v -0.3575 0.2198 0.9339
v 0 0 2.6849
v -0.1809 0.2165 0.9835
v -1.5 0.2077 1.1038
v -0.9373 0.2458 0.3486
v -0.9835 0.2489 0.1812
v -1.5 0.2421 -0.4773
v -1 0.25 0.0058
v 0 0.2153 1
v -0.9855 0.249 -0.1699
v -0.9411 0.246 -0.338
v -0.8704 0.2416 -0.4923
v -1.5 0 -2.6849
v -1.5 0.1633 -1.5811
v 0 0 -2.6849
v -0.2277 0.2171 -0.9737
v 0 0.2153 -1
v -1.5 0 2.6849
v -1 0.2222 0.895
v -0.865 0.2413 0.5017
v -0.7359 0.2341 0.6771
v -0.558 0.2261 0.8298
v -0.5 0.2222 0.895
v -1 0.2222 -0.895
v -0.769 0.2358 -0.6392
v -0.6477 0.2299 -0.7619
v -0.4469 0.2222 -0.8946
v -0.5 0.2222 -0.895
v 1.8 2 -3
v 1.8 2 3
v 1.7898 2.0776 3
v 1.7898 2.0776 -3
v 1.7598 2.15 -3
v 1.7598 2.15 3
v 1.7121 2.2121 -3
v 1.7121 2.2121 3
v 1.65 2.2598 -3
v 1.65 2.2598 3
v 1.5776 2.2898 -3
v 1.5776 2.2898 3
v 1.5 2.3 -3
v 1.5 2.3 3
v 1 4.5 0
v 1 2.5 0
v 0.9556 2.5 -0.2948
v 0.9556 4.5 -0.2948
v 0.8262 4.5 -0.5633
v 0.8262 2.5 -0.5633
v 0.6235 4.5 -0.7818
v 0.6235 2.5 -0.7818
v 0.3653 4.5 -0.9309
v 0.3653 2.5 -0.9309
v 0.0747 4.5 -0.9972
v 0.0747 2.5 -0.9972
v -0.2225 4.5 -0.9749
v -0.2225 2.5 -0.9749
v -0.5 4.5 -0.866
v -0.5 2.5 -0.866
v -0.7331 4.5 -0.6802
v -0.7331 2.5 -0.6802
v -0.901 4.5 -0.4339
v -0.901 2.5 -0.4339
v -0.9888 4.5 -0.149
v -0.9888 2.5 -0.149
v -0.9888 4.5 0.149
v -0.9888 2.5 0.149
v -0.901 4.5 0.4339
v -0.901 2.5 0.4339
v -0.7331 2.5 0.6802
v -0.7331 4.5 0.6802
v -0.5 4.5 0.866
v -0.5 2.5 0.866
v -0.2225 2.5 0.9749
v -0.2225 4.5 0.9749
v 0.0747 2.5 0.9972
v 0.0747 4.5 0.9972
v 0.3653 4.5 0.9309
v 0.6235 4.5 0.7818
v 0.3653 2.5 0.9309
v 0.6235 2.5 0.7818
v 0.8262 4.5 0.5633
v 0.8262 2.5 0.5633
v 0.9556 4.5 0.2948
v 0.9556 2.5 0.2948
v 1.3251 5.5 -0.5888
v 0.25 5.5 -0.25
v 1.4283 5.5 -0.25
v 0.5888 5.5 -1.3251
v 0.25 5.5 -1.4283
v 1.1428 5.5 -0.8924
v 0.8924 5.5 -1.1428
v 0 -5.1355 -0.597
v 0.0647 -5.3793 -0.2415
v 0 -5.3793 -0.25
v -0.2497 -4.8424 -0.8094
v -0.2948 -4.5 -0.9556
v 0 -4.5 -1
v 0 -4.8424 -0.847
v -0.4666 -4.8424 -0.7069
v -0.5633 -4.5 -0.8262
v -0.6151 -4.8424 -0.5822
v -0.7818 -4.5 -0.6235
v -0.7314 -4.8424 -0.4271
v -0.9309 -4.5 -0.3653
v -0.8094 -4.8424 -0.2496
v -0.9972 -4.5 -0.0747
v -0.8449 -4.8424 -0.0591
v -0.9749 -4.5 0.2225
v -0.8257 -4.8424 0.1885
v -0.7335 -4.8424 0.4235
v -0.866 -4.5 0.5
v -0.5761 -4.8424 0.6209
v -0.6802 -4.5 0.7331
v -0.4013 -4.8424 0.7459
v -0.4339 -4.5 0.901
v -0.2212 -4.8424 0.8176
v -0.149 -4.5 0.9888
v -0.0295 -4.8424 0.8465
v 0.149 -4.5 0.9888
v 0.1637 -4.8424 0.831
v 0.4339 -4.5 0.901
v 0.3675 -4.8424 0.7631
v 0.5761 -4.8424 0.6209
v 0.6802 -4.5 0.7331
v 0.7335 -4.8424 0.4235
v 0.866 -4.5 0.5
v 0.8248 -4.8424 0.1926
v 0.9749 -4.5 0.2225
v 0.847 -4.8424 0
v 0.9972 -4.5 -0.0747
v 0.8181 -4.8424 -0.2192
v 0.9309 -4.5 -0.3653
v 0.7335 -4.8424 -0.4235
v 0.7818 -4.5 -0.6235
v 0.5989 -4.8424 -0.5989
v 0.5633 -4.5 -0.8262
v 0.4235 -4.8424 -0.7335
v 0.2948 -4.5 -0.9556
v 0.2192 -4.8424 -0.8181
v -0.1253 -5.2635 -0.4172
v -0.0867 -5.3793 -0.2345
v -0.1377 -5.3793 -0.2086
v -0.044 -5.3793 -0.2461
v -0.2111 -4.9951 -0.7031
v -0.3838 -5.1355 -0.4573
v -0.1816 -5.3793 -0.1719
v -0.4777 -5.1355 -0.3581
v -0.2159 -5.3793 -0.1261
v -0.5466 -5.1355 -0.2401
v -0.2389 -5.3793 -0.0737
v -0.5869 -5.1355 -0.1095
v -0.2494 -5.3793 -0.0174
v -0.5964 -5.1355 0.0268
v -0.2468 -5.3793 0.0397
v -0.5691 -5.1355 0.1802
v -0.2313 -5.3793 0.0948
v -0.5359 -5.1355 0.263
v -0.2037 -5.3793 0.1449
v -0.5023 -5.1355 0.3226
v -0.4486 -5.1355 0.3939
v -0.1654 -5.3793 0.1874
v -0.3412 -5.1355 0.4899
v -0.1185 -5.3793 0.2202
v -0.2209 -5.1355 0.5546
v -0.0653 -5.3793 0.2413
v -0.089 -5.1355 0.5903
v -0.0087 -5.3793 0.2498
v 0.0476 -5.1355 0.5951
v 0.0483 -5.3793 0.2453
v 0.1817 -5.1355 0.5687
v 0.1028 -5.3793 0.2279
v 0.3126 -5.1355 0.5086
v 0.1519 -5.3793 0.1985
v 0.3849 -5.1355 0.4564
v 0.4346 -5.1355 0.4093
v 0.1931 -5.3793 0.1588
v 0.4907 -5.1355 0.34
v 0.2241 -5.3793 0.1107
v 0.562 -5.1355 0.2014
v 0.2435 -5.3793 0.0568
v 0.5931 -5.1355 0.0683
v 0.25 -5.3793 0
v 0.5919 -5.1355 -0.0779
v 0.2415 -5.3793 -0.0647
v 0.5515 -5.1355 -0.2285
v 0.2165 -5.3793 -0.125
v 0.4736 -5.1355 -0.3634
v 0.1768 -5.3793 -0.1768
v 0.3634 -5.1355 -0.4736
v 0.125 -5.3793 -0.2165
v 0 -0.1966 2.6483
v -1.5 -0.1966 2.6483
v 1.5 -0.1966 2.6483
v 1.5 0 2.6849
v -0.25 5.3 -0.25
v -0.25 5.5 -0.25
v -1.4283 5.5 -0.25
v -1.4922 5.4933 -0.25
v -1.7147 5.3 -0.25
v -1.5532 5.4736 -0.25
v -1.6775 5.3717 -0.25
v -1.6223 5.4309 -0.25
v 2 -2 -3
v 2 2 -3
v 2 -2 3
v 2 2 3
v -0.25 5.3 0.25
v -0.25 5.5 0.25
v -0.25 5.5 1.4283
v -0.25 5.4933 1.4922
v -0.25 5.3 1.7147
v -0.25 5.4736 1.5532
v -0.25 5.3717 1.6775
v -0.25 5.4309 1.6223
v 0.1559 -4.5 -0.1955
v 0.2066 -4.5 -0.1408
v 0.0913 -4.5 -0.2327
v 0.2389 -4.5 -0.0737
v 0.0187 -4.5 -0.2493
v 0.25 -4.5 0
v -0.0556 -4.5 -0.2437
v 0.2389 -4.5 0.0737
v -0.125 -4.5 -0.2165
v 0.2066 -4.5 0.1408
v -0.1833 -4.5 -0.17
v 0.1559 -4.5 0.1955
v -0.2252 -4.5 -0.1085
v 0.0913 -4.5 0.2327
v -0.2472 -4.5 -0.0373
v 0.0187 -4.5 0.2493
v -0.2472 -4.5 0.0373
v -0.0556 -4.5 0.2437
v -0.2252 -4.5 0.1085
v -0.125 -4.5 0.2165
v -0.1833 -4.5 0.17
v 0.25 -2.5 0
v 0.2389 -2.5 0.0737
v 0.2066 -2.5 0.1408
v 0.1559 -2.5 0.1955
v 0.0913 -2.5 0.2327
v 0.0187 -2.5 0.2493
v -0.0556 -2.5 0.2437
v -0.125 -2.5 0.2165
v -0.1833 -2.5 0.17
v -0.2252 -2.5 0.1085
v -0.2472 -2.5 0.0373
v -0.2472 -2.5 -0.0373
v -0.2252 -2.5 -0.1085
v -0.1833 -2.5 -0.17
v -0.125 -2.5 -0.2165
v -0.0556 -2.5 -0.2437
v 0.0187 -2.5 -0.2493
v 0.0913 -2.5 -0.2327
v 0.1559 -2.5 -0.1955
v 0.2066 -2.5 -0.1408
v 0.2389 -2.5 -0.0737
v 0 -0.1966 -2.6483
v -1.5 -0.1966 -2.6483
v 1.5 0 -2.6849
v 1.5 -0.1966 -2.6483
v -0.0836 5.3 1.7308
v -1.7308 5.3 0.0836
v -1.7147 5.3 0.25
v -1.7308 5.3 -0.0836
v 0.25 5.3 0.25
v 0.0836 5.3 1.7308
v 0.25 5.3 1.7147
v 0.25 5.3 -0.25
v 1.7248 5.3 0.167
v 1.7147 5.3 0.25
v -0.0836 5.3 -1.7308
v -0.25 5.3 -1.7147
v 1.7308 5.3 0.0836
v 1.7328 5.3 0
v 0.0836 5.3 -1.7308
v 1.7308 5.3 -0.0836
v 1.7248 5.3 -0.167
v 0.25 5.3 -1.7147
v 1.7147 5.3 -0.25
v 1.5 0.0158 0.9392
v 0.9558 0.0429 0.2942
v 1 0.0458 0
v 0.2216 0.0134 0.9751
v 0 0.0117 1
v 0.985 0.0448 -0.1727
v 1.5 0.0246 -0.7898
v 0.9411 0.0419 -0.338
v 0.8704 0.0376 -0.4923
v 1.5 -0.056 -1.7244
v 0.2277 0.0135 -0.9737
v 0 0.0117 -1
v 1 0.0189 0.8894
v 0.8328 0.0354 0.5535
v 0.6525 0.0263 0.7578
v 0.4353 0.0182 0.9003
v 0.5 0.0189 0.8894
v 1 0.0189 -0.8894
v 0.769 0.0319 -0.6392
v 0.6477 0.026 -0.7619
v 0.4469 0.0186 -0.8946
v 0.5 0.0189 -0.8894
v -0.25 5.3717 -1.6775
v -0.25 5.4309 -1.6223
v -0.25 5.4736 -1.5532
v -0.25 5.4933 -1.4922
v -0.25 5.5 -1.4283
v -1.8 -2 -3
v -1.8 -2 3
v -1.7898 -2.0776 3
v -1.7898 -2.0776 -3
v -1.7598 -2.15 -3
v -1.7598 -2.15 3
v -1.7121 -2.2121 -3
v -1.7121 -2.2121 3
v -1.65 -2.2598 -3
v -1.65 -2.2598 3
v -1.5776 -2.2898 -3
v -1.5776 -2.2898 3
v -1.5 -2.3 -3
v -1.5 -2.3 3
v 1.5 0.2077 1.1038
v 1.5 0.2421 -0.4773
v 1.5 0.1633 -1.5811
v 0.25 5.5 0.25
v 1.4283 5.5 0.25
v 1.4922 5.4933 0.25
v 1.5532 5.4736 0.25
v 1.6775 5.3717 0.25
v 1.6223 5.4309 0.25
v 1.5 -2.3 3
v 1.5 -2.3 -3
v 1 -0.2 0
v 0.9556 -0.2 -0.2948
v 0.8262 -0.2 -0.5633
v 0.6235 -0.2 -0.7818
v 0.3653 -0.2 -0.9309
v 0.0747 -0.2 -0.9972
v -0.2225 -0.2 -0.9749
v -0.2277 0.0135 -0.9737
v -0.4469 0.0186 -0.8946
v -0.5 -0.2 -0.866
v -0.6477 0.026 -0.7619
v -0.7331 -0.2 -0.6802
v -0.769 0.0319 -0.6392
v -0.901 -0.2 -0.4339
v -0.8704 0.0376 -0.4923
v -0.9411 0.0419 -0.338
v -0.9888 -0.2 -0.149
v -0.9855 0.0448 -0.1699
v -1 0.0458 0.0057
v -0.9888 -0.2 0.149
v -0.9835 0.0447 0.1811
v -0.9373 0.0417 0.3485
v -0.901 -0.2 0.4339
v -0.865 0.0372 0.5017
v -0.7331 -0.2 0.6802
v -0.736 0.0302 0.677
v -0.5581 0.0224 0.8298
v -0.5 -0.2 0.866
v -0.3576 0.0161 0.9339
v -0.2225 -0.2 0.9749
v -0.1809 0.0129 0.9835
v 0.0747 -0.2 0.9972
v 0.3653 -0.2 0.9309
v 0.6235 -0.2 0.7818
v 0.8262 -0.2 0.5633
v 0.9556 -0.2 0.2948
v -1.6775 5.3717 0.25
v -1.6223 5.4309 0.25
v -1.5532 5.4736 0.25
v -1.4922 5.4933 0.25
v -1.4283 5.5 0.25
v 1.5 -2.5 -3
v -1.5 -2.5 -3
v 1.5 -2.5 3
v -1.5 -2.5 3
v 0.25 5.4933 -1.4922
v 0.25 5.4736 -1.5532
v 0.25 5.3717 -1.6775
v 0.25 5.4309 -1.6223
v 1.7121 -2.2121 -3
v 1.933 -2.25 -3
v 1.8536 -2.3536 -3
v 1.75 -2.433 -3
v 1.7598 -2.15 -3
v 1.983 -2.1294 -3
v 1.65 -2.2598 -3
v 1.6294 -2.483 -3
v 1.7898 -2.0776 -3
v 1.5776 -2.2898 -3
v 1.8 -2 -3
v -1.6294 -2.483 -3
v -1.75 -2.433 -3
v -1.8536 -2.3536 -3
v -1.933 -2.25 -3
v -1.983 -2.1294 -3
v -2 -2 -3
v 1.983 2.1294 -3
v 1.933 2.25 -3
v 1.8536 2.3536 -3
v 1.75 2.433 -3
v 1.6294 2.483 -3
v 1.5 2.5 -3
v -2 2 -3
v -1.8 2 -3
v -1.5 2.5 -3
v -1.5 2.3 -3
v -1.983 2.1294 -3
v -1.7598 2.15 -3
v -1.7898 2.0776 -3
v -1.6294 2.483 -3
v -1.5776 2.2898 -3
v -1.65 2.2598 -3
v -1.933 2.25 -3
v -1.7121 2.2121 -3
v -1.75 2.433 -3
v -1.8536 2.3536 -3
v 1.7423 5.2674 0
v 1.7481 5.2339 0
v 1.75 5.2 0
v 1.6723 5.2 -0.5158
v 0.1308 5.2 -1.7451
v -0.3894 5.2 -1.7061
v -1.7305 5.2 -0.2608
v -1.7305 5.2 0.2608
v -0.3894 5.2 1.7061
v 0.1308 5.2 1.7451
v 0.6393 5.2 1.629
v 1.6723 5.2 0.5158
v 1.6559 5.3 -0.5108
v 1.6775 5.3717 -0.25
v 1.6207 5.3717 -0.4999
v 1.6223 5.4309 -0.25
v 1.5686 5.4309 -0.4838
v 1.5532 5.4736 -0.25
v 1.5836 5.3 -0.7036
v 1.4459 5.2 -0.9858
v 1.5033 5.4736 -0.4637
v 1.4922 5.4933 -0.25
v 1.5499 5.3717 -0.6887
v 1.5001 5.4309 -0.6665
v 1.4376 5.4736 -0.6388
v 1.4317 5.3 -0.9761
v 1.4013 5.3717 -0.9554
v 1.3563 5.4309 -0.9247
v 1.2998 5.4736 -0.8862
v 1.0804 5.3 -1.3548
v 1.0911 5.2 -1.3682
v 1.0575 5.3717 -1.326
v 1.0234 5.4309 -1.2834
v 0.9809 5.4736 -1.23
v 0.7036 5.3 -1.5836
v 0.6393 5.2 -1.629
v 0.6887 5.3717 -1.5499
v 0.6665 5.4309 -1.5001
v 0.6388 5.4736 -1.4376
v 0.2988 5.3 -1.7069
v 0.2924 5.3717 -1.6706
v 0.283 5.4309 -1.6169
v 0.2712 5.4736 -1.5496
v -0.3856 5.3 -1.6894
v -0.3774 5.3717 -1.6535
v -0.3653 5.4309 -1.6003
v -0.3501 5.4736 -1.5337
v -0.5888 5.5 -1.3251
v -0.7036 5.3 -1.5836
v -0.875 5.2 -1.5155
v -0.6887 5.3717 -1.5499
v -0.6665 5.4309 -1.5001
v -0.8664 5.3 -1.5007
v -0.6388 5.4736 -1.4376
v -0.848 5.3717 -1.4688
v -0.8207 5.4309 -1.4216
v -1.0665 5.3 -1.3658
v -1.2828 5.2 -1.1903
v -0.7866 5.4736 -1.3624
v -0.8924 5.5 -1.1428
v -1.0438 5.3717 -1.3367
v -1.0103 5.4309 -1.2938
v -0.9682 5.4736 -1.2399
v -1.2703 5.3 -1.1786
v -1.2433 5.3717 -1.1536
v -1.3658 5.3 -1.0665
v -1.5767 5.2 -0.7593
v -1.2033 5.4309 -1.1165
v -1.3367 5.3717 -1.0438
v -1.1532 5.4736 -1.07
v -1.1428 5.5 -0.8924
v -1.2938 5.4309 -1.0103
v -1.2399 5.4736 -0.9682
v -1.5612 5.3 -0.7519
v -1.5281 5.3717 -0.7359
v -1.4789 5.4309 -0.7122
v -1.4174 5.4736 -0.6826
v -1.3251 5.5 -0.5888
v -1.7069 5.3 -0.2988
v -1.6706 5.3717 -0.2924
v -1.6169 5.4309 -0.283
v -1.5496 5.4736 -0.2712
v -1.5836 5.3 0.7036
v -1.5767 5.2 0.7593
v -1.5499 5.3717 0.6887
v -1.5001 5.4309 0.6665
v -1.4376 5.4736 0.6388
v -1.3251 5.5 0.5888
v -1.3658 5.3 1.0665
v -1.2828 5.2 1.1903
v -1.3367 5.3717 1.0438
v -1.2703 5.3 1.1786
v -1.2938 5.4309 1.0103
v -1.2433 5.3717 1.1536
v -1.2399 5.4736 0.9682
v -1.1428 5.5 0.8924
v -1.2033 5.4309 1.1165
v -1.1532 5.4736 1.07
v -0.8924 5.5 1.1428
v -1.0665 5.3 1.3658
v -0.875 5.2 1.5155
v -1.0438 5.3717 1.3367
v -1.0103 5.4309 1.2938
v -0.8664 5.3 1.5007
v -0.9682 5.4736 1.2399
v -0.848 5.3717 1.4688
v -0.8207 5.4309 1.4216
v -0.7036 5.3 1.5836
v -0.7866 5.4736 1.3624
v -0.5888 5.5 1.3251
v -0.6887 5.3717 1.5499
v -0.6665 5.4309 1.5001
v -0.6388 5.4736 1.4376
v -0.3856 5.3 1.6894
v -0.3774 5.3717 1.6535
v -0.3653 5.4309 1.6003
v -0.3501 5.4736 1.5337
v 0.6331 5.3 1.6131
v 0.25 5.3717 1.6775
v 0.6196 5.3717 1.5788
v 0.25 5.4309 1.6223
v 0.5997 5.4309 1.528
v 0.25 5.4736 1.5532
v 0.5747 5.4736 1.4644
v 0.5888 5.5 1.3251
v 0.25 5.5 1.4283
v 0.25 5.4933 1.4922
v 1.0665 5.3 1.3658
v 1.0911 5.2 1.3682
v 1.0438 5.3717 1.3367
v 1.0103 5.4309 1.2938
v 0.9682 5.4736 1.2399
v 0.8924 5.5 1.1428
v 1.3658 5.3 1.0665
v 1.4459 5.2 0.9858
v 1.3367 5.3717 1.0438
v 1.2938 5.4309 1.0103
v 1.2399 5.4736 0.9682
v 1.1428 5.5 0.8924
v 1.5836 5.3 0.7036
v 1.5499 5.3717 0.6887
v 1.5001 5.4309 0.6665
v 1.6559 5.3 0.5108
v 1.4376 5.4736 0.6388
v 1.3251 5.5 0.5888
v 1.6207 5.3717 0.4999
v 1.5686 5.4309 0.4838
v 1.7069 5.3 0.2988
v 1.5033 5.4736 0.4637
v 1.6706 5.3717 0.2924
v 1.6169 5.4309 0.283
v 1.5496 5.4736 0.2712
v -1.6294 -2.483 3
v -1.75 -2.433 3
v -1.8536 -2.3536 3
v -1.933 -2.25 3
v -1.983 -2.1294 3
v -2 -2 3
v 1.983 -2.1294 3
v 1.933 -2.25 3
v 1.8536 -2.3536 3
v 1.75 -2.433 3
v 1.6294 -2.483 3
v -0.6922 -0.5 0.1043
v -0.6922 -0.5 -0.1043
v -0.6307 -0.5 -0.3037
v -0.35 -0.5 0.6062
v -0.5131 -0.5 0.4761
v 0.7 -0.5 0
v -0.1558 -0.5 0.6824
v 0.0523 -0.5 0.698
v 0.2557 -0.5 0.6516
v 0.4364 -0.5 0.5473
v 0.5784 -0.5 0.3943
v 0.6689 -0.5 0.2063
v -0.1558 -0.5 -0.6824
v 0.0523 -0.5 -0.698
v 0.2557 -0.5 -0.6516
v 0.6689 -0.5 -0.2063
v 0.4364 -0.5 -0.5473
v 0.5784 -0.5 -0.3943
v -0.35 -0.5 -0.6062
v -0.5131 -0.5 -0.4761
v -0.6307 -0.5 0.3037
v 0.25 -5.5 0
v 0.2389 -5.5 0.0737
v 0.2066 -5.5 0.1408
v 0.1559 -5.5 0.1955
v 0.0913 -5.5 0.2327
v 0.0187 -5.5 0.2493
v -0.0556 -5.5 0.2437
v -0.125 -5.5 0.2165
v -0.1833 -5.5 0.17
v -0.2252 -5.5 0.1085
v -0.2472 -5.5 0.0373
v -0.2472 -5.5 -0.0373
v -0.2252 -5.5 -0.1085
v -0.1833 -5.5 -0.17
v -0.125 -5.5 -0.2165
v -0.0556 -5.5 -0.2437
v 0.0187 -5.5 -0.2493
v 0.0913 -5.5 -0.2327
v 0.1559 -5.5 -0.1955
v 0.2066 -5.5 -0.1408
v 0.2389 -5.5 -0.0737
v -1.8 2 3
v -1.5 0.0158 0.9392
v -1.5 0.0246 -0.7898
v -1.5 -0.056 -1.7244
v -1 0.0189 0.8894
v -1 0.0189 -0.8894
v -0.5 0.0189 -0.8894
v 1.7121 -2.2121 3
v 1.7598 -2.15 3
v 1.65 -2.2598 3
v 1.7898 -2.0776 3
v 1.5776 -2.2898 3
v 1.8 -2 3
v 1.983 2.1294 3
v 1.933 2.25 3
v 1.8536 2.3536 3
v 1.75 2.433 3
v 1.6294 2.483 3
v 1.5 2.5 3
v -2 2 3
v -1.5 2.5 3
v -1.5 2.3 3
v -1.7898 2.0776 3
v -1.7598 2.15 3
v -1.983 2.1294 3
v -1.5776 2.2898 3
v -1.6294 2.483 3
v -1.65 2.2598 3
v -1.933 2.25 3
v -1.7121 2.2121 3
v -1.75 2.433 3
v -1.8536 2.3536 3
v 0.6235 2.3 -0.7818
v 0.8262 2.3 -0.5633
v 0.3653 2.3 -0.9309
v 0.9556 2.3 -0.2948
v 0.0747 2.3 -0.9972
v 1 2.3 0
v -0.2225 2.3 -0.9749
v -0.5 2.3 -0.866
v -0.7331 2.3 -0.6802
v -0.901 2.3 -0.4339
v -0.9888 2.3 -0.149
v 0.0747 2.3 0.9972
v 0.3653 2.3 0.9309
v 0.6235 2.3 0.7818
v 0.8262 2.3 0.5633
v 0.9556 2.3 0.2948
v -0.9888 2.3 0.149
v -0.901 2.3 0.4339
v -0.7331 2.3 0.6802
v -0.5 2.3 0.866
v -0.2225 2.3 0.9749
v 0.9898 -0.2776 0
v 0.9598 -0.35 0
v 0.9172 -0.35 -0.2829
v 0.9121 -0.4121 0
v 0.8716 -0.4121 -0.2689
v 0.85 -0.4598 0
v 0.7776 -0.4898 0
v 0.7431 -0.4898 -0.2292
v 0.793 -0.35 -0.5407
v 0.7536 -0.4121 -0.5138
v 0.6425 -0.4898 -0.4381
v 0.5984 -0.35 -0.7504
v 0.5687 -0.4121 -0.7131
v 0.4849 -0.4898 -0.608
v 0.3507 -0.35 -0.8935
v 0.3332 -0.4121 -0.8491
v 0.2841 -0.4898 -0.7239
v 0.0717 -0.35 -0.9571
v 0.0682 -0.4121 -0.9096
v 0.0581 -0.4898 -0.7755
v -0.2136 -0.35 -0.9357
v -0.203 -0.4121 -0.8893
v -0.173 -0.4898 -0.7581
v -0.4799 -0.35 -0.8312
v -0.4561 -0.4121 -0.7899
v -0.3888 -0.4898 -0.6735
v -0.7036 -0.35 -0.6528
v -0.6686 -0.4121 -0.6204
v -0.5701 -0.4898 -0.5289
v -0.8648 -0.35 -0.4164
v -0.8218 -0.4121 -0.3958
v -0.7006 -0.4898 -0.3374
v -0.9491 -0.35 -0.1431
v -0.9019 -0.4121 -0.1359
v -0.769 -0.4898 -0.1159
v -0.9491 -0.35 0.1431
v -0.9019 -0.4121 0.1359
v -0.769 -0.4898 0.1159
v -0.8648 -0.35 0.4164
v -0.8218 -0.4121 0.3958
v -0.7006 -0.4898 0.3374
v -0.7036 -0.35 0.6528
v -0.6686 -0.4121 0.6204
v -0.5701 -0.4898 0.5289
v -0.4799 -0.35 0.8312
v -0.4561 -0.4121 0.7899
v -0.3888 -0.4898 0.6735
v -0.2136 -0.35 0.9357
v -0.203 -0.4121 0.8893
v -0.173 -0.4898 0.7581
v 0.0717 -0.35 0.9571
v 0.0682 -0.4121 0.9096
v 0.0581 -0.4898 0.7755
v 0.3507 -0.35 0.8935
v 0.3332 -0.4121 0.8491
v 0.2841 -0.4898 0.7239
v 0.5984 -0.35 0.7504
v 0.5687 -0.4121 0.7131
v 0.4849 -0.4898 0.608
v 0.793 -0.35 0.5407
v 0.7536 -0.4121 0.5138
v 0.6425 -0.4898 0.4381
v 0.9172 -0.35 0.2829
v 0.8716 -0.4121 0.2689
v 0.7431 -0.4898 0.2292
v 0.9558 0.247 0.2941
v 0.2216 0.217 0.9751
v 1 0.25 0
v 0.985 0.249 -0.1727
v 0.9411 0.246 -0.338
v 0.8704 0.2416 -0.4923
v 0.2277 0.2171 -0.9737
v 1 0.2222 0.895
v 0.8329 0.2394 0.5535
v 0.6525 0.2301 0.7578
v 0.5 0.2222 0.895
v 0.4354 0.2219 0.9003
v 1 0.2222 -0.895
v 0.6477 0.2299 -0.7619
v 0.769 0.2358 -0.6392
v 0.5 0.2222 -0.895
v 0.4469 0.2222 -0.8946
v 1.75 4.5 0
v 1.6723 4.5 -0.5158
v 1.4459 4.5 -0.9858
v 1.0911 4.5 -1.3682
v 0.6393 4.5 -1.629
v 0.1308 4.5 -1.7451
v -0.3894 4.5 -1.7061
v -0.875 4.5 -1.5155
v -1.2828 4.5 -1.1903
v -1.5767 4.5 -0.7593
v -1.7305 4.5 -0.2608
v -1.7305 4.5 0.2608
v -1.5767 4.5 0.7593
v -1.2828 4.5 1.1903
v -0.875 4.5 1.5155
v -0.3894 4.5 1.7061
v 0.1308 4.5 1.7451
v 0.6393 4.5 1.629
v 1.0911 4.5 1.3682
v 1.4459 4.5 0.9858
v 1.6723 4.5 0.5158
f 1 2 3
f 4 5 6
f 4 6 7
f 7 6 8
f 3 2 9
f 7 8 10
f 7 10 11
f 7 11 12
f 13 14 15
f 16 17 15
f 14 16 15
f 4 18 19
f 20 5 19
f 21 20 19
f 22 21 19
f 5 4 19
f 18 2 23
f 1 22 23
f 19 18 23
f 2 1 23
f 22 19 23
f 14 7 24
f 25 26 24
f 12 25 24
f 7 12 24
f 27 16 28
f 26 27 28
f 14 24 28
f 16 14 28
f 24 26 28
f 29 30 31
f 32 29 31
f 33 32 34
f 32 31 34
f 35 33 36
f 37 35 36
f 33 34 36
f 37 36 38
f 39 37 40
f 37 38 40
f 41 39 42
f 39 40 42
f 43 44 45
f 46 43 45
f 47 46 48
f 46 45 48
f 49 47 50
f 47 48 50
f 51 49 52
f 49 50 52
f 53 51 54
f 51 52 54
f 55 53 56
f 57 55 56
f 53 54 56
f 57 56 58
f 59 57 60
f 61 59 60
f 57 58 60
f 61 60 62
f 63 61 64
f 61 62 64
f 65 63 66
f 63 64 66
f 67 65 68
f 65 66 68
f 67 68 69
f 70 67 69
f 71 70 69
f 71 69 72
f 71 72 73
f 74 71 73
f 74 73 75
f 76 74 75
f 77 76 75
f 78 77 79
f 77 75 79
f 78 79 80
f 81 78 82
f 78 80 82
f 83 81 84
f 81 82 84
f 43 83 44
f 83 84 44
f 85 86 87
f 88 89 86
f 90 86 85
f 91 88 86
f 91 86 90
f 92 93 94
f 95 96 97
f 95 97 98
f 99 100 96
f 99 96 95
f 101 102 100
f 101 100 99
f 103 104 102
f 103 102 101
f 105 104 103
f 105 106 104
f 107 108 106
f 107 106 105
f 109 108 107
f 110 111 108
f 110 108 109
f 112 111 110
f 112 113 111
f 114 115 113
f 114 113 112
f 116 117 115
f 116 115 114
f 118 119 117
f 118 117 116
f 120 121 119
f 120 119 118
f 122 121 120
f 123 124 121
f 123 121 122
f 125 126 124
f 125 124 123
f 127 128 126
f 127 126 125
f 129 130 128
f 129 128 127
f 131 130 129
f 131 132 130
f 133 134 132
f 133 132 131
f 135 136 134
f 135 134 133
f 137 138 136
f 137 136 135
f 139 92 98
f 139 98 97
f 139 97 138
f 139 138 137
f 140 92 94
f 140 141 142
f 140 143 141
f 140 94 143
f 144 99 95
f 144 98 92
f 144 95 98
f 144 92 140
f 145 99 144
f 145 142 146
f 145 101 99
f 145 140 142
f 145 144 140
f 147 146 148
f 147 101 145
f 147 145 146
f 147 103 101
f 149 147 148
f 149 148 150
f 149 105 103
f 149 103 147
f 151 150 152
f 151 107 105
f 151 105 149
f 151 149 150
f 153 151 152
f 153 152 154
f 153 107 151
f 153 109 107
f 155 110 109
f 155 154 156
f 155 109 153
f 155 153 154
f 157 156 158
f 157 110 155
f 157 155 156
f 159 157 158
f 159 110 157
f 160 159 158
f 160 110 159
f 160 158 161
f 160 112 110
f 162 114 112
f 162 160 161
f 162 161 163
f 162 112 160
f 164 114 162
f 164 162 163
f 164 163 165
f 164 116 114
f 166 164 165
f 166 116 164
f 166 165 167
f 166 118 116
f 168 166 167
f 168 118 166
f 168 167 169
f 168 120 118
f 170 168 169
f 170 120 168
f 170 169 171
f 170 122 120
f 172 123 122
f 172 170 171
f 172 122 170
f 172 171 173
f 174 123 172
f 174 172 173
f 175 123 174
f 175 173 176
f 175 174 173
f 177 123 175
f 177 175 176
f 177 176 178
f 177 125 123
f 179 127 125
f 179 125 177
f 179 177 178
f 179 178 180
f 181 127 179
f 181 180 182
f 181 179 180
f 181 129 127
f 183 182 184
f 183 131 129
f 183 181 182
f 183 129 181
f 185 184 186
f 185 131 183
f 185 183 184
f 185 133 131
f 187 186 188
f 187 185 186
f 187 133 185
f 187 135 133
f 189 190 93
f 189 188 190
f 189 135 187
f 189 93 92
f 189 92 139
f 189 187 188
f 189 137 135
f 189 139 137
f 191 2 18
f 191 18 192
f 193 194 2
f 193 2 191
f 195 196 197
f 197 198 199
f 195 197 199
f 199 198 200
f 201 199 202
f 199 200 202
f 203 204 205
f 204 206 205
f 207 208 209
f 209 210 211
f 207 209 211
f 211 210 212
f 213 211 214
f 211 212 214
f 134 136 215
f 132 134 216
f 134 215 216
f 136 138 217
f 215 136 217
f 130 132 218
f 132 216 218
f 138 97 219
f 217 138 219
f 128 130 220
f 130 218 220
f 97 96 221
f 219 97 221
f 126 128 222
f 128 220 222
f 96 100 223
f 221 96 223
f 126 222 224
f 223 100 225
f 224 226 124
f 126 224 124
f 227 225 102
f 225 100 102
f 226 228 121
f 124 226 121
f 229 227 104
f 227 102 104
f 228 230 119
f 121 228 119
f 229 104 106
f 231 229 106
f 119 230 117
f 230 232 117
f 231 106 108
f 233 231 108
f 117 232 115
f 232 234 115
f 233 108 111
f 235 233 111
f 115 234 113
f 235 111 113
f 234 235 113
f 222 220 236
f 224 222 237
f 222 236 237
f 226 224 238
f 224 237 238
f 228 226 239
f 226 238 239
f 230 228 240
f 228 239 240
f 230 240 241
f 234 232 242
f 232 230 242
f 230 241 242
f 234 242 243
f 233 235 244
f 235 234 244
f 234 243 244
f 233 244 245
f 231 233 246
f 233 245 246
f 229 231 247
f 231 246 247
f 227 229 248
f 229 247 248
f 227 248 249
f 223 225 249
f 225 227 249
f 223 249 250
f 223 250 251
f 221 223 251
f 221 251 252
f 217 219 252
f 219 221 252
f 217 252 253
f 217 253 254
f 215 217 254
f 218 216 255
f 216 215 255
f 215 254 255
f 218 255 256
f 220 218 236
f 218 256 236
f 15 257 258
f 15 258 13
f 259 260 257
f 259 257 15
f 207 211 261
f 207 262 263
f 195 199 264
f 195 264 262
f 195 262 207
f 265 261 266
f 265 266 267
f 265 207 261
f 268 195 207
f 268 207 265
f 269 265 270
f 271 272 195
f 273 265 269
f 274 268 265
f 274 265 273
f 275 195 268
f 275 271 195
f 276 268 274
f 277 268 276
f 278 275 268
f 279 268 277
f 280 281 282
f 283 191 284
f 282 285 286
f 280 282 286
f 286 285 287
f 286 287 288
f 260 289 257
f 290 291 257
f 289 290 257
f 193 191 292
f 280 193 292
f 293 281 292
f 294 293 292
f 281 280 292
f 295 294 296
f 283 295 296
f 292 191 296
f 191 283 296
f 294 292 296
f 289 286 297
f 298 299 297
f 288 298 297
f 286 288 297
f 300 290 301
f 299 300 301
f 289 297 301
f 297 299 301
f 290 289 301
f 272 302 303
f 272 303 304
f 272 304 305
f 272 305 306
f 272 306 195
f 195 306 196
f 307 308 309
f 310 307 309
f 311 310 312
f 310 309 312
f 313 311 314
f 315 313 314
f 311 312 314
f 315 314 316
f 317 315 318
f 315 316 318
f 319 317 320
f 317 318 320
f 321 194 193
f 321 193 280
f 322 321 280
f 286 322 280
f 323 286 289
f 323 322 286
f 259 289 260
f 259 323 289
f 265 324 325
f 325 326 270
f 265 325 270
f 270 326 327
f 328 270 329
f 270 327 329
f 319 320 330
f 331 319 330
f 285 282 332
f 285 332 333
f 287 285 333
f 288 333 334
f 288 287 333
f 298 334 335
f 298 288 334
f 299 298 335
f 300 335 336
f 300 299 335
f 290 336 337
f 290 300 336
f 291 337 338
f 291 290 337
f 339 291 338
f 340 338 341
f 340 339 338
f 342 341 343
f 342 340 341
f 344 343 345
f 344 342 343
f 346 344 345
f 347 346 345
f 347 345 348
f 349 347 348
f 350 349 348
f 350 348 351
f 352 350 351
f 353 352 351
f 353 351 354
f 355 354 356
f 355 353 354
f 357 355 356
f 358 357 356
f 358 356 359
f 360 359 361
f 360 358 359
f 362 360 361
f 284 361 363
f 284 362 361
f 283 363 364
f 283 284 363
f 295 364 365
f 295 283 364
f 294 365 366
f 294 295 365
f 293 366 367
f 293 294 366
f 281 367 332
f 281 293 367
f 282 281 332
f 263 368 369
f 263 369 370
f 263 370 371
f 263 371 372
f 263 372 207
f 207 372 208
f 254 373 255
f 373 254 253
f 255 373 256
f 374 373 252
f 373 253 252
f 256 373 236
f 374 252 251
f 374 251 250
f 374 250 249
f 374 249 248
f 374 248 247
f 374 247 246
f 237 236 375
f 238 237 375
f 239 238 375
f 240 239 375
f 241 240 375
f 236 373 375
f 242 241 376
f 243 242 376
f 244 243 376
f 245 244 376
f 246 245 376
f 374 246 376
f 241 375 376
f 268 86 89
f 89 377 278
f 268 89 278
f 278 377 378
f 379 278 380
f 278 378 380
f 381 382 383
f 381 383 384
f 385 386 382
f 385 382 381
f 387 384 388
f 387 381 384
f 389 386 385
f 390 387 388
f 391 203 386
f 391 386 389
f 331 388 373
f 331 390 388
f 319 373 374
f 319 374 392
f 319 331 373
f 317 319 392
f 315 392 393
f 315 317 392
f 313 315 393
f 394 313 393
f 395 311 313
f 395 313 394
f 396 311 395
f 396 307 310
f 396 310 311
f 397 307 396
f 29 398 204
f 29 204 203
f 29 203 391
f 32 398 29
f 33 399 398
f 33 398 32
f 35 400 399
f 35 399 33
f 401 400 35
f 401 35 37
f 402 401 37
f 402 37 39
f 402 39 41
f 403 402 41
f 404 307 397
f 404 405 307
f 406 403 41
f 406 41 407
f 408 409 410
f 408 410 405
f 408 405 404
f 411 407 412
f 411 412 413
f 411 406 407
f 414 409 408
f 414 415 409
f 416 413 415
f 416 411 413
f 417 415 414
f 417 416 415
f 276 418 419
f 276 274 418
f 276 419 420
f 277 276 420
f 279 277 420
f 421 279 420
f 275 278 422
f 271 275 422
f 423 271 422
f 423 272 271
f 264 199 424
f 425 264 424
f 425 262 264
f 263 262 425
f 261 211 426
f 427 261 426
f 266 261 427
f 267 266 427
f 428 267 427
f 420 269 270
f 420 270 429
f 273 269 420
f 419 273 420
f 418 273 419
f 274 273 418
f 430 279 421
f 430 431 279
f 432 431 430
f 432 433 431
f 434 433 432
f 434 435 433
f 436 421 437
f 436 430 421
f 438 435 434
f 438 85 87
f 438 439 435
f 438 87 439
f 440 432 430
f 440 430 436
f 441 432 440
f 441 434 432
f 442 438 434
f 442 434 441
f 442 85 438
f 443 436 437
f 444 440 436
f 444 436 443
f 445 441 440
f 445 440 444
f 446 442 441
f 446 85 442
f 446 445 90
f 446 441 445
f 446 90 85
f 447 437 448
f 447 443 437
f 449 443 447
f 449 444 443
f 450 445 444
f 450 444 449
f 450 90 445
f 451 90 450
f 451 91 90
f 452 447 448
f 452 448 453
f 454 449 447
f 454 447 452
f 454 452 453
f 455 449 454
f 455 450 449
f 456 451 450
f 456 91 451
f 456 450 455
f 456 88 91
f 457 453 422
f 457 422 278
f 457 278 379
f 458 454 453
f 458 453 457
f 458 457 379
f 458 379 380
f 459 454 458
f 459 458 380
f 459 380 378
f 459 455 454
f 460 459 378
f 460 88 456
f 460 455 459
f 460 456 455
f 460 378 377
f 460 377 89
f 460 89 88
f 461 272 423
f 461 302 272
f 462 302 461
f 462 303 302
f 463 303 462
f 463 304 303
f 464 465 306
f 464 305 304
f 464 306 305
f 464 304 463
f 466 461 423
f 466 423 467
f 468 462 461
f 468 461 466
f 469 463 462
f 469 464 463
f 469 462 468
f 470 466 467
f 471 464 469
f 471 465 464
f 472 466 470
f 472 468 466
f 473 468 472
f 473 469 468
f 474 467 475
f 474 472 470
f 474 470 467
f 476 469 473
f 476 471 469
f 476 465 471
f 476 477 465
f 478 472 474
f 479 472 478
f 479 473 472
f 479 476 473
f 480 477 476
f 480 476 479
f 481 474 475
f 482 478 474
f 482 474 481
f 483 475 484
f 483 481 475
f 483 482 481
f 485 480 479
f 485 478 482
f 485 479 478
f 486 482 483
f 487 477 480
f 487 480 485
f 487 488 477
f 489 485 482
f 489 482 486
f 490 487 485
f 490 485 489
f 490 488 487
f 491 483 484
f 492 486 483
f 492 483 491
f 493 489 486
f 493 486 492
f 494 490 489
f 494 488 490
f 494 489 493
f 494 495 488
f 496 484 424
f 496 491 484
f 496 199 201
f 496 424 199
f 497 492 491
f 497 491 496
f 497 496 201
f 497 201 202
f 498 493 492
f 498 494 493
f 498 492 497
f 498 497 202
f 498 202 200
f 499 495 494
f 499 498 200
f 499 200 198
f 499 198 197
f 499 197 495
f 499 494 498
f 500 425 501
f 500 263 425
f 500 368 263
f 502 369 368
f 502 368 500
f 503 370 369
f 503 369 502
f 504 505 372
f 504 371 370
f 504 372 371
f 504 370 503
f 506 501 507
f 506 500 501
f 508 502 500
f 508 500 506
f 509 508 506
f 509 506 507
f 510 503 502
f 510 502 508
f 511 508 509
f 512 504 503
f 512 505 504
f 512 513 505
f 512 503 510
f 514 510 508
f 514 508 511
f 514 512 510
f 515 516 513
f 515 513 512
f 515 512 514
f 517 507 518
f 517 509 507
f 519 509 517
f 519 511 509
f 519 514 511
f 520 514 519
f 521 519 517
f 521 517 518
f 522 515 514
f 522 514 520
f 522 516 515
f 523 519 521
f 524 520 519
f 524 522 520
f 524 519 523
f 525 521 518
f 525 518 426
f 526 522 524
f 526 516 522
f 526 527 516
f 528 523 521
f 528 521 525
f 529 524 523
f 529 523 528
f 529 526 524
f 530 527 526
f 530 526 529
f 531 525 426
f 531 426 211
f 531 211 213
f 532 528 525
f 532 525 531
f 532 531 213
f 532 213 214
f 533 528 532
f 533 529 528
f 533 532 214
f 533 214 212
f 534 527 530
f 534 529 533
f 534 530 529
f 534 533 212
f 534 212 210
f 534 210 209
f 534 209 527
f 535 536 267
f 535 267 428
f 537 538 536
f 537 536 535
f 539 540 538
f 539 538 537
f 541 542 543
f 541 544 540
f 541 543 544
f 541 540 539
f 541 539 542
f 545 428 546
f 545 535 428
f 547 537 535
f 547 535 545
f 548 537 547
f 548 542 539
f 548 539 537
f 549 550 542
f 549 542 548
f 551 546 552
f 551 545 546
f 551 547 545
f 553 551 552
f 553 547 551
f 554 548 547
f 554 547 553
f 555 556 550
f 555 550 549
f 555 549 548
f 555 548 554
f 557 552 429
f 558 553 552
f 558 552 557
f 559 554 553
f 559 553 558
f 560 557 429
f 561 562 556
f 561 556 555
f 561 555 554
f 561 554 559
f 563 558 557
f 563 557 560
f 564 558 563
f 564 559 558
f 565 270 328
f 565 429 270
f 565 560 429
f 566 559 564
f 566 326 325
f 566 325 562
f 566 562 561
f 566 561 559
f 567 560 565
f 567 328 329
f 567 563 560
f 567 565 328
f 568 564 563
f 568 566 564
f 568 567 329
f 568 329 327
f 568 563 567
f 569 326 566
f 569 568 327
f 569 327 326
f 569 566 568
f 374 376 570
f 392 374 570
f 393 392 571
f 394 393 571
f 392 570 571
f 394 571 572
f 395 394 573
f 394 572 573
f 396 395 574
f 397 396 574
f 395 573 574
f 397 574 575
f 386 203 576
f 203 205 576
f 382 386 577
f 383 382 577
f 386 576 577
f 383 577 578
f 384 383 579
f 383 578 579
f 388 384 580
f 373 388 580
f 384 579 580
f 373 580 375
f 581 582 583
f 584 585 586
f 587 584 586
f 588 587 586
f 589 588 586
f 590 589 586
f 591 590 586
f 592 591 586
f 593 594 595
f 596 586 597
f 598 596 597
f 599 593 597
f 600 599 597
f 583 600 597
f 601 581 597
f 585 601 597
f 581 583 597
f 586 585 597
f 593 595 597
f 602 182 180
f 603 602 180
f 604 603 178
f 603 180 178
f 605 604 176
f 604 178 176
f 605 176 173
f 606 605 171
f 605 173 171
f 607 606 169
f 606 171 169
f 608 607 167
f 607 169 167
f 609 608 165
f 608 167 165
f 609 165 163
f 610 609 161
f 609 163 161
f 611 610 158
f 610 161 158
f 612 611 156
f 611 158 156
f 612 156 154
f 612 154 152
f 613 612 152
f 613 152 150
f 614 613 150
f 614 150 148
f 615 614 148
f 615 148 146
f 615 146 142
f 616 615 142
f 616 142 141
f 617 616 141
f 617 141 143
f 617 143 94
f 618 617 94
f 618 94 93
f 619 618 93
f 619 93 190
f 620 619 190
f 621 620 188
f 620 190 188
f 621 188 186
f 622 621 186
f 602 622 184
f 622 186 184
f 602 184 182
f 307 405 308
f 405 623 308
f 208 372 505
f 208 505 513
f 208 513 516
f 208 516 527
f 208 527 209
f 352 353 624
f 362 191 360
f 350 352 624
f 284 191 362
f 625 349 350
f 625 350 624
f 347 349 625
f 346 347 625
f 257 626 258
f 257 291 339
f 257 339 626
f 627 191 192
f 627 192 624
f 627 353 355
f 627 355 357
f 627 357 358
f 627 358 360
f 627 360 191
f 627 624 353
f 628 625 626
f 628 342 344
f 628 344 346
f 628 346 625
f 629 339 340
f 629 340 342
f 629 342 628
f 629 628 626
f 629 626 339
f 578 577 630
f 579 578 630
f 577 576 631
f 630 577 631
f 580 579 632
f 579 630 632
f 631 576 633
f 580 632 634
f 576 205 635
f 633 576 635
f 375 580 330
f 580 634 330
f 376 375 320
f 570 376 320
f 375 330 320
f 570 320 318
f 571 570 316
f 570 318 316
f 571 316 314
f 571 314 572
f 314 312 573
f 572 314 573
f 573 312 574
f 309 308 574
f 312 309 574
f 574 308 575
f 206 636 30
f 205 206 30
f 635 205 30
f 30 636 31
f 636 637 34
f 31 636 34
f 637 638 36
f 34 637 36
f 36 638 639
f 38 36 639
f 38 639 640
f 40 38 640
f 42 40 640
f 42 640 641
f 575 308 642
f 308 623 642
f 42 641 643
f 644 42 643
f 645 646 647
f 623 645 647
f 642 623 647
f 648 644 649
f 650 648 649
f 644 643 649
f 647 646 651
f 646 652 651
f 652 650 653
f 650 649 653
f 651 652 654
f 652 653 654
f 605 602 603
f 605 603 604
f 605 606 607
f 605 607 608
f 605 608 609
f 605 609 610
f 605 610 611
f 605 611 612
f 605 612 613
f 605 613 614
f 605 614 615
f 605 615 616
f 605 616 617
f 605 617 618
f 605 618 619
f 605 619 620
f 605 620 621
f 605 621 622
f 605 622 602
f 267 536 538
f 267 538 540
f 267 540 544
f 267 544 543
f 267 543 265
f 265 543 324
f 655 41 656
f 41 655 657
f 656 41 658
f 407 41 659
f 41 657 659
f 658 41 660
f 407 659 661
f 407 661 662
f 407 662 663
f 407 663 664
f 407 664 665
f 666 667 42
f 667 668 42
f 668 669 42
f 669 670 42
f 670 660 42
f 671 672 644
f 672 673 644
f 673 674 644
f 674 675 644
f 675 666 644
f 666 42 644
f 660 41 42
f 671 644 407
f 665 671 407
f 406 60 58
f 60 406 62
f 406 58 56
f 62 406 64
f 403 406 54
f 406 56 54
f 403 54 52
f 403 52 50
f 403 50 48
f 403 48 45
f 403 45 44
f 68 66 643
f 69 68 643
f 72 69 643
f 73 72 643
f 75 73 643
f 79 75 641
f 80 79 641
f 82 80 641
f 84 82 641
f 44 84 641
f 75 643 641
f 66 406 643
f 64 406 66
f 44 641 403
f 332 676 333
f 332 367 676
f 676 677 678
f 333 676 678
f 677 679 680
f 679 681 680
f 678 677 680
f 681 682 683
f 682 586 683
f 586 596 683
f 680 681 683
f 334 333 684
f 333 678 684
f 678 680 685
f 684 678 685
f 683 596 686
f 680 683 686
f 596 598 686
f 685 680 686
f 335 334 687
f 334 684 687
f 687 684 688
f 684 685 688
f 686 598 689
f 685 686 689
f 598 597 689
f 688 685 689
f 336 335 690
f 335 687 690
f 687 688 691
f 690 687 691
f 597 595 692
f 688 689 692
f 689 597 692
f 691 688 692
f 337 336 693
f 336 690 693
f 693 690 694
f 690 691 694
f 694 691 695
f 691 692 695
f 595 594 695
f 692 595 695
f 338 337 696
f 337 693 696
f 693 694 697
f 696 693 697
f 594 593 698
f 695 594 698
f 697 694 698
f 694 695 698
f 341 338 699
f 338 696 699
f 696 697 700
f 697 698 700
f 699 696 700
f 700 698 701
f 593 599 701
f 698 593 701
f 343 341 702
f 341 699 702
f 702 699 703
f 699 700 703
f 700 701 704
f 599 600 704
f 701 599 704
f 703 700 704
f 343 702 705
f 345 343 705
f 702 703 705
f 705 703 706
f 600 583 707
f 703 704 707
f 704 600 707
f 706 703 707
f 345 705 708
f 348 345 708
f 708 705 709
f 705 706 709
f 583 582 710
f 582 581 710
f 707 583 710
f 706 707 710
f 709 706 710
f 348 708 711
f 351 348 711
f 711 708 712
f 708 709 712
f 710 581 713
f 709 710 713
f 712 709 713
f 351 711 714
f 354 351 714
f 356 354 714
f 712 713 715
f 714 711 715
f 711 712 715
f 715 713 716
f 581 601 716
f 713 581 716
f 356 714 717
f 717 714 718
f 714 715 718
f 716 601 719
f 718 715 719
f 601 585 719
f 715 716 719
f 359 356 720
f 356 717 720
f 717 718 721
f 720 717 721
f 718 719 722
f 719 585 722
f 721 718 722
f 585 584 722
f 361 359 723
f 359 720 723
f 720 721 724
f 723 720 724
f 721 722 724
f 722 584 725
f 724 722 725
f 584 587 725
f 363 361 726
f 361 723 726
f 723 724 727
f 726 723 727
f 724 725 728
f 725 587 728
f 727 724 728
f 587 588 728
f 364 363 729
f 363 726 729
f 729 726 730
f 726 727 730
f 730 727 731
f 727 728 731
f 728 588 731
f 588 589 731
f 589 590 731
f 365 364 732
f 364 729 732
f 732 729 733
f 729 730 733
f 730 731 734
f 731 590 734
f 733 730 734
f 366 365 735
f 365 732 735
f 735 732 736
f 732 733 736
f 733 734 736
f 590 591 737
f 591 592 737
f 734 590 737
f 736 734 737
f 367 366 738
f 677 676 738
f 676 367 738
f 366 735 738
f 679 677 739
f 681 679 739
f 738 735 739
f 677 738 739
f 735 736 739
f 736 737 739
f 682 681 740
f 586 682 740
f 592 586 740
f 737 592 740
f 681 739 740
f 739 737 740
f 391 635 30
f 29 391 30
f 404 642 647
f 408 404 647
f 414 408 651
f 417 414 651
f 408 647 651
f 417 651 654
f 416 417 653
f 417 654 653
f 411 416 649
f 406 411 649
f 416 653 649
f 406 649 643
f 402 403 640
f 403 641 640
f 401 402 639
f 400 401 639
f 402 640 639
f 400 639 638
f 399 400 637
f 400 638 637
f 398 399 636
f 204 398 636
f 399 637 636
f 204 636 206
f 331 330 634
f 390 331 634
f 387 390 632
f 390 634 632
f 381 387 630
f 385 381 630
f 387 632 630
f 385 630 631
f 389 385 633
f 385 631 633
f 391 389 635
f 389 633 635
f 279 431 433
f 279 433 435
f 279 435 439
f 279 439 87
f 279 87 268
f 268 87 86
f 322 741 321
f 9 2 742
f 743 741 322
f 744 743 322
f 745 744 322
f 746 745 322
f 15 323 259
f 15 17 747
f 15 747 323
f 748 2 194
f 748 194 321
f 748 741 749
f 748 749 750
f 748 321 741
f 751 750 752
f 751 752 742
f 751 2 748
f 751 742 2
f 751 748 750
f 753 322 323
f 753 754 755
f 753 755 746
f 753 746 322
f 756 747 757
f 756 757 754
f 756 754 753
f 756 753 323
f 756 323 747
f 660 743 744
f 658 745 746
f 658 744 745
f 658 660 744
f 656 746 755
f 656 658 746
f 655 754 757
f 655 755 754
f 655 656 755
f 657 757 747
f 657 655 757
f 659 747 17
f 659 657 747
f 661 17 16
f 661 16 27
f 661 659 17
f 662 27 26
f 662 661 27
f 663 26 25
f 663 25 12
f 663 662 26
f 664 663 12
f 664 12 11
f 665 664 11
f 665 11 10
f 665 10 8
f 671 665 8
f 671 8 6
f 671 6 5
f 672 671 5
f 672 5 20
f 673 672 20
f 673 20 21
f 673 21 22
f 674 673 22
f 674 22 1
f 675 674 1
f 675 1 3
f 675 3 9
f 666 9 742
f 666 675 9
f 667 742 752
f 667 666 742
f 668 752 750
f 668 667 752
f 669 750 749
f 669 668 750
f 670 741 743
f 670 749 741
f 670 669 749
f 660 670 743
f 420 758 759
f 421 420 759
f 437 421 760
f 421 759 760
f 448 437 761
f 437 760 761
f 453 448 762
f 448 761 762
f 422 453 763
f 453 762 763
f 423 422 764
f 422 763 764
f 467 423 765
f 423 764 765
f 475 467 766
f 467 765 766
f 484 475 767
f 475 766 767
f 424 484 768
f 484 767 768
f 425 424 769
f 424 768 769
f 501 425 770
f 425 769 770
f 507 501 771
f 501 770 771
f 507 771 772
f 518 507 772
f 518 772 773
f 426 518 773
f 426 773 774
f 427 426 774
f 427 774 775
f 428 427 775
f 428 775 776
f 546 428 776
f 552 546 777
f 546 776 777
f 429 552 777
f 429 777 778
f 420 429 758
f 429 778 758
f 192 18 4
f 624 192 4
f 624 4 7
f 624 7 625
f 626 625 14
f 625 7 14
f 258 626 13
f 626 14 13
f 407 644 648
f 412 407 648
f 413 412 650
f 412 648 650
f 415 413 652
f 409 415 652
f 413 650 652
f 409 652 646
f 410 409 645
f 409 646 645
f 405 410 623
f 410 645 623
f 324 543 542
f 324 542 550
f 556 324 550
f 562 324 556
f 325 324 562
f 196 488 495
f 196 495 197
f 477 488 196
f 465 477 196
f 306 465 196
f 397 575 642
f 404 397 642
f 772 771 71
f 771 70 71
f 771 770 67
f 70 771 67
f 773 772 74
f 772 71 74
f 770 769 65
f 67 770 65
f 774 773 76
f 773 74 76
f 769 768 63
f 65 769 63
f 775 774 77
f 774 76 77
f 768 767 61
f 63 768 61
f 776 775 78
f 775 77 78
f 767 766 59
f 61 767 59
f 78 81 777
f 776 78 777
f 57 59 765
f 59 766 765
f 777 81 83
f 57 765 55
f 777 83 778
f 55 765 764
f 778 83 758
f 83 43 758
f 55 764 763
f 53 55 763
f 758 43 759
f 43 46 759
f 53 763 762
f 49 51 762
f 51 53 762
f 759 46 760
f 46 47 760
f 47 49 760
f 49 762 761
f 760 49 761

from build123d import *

# Parameters (mm, degrees)
Y_KSEKLIK_EKSTR_ZYON1_DEPTH      = 3
Y_KSEKLIK_EKSTR_ZYON1_DEPTH_BACK = 3
Y_KSEKLIK_EKSTR_ZYON7_DEPTH      = 1.5
Y_KSEKLIK_EKSTR_ZYON7_DEPTH_BACK = 1.5
Y_KSEKLIK_EKSTR_ZYON8_DEPTH      = 2
Y_KSEKLIK_EKSTR_ZYON8_DEPTH_BACK = 3
IZIM11_R                         = 1
RADYUS3_R                        = 0.3
IZIM12_R                         = 1.75
Y_KSEKLIK_EKSTR_ZYON9_DEPTH      = 1
RADYUS4_R                        = 0.3
KES_EKSTR_ZYON5_DEPTH            = 0.2
IZIM14_R                         = 0.25
Y_KSEKLIK_EKSTR_ZYON10_DEPTH     = 3


with BuildPart() as part:
    # Çizim1 → Yükseklik-Ekstrüzyon1 (new, two sides: drawn at the far end of the back side and taken through both)
    with BuildSketch(Plane.XY.offset(-Y_KSEKLIK_EKSTR_ZYON1_DEPTH_BACK)):
        with BuildLine():
            Line((-1.5, 2.5), (1.5, 2.5))
            ThreePointArc((1.5, 2.5), (1.853553391, 2.353553391), (2, 2))
            Line((2, 2), (2, -2))
            ThreePointArc((2, -2), (1.853553391, -2.353553391), (1.5, -2.5))
            Line((1.5, -2.5), (-1.5, -2.5))
            ThreePointArc((-1.5, -2.5), (-1.853553391, -2.353553391), (-2, -2))
            Line((-2, -2), (-2, 2))
            ThreePointArc((-2, 2), (-1.853553391, 2.353553391), (-1.5, 2.5))
        make_face()
        with BuildLine():
            Line((-1.8, 2), (-1.8, -2))
            ThreePointArc((-1.8, -2), (-1.712132034, -2.212132034), (-1.5, -2.3))
            Line((-1.5, -2.3), (1.5, -2.3))
            ThreePointArc((1.5, -2.3), (1.712132034, -2.212132034), (1.8, -2))
            Line((1.8, -2), (1.8, 2))
            ThreePointArc((1.8, 2), (1.712132034, 2.212132034), (1.5, 2.3))
            Line((1.5, 2.3), (-1.5, 2.3))
            ThreePointArc((-1.5, 2.3), (-1.712132034, 2.212132034), (-1.8, 2))
        make_face(mode=Mode.SUBTRACT)
    extrude(amount=Y_KSEKLIK_EKSTR_ZYON1_DEPTH + Y_KSEKLIK_EKSTR_ZYON1_DEPTH_BACK)



with BuildPart() as body_2:
    # Çizim10 → Yükseklik-Ekstrüzyon7 (new, two sides: drawn at the far end of the back side and taken through both)
    with BuildSketch(Plane(origin=(0, 0, 0), x_dir=(0, 0, -1), z_dir=(1, 0, 0)).offset(-Y_KSEKLIK_EKSTR_ZYON7_DEPTH_BACK)):
        with BuildLine():
            Line((-2.684933096, 0), (-2.648317711, -0.196619718))
            add(Edge.make_bspline(
                [(-2.648317711, -0.196619718), (-0.912612771, 0.126610857), (0.912612771, 0.126610857), (2.648317711, -0.196619718)],
                knots=[0, 0, 0, 0, 1, 1, 1, 1], degree=3))
            Line((2.648317711, -0.196619718), (2.684933096, 0))
            add(Edge.make_bspline(
                [(-2.684933096, 0), (-0.894977699, 0.333333333), (0.894977699, 0.333333333), (2.684933096, 0)],
                knots=[0, 0, 0, 0, 1, 1, 1, 1], degree=3))
        make_face()
    extrude(amount=Y_KSEKLIK_EKSTR_ZYON7_DEPTH + Y_KSEKLIK_EKSTR_ZYON7_DEPTH_BACK)


with BuildPart() as part_1:
    add(part.part)

    add(body_2.part)  # Yükseklik-Ekstrüzyon8 merges body 2
    # Çizim11 → Yükseklik-Ekstrüzyon8 (add, two sides: drawn at the far end of the back side and taken through both)
    with BuildSketch(Plane(origin=(0, 2.5, 0), x_dir=(1, 0, 0), z_dir=(0, 1, 0)).offset(-Y_KSEKLIK_EKSTR_ZYON8_DEPTH_BACK)):
        Circle(IZIM11_R)
    extrude(amount=Y_KSEKLIK_EKSTR_ZYON8_DEPTH + Y_KSEKLIK_EKSTR_ZYON8_DEPTH_BACK)

    # Radyus3
    radyus3_edges = [part_1.edges().sort_by_distance(p)[0] for p in [
        (-1, -0.5, 0),
    ]]
    fillet(radyus3_edges, radius=RADYUS3_R)

    # Çizim12 → Yükseklik-Ekstrüzyon9 (add)
    with BuildSketch(Plane(origin=(0, 4.5, 0), x_dir=(1, 0, 0), z_dir=(0, 1, 0))):
        Circle(IZIM12_R)
    extrude(amount=Y_KSEKLIK_EKSTR_ZYON9_DEPTH)

    # Radyus4
    radyus4_edges = [part_1.edges().sort_by_distance(p)[0] for p in [
        (-1.75, 5.5, 0),
    ]]
    fillet(radyus4_edges, radius=RADYUS4_R)

    # Çizim13 → Kes-Ekstrüzyon5 (cut)
    with BuildSketch(Plane(origin=(0, 5.5, 0), x_dir=(1, 0, 0), z_dir=(0, 1, 0))):
        Polygon((-0.25, -0.25), (-0.25, -2.096616873), (0.25, -2.096616873), (0.25, -0.25), (2.70967232, -0.25), (2.70967232, 0.25), (0.25, 0.25), (0.25, 2.096616873), (-0.25, 2.096616873), (-0.25, 0.25), (-2.70967232, 0.25), (-2.70967232, -0.25), align=None)
    extrude(amount=-KES_EKSTR_ZYON5_DEPTH, mode=Mode.SUBTRACT)

    # Çizim14 → Yükseklik-Ekstrüzyon10 (add)
    with BuildSketch(Plane.XZ.offset(2.5)):
        Circle(IZIM14_R)
    extrude(amount=Y_KSEKLIK_EKSTR_ZYON10_DEPTH)

    # Çizim15 → Döndür2 (revolve)
    with BuildSketch(Plane(origin=(0, 0, 0), x_dir=(0, 0, -1), z_dir=(1, 0, 0))):
        with BuildLine():
            Line((0, -5.5), (0, -4.5))
            Line((0, -4.5), (1, -4.5))
            add(Edge.make_bspline(
                [(0, -5.5), (0.812408403, -5.158653256), (1, -4.5)],
                knots=[0, 0, 0, 0.79847646, 0.79847646, 0.79847646], degree=2))
        make_face()
    revolve(axis=Axis((0, -5.5, 0), (0, 1, 0)))


solid = part_1.part
